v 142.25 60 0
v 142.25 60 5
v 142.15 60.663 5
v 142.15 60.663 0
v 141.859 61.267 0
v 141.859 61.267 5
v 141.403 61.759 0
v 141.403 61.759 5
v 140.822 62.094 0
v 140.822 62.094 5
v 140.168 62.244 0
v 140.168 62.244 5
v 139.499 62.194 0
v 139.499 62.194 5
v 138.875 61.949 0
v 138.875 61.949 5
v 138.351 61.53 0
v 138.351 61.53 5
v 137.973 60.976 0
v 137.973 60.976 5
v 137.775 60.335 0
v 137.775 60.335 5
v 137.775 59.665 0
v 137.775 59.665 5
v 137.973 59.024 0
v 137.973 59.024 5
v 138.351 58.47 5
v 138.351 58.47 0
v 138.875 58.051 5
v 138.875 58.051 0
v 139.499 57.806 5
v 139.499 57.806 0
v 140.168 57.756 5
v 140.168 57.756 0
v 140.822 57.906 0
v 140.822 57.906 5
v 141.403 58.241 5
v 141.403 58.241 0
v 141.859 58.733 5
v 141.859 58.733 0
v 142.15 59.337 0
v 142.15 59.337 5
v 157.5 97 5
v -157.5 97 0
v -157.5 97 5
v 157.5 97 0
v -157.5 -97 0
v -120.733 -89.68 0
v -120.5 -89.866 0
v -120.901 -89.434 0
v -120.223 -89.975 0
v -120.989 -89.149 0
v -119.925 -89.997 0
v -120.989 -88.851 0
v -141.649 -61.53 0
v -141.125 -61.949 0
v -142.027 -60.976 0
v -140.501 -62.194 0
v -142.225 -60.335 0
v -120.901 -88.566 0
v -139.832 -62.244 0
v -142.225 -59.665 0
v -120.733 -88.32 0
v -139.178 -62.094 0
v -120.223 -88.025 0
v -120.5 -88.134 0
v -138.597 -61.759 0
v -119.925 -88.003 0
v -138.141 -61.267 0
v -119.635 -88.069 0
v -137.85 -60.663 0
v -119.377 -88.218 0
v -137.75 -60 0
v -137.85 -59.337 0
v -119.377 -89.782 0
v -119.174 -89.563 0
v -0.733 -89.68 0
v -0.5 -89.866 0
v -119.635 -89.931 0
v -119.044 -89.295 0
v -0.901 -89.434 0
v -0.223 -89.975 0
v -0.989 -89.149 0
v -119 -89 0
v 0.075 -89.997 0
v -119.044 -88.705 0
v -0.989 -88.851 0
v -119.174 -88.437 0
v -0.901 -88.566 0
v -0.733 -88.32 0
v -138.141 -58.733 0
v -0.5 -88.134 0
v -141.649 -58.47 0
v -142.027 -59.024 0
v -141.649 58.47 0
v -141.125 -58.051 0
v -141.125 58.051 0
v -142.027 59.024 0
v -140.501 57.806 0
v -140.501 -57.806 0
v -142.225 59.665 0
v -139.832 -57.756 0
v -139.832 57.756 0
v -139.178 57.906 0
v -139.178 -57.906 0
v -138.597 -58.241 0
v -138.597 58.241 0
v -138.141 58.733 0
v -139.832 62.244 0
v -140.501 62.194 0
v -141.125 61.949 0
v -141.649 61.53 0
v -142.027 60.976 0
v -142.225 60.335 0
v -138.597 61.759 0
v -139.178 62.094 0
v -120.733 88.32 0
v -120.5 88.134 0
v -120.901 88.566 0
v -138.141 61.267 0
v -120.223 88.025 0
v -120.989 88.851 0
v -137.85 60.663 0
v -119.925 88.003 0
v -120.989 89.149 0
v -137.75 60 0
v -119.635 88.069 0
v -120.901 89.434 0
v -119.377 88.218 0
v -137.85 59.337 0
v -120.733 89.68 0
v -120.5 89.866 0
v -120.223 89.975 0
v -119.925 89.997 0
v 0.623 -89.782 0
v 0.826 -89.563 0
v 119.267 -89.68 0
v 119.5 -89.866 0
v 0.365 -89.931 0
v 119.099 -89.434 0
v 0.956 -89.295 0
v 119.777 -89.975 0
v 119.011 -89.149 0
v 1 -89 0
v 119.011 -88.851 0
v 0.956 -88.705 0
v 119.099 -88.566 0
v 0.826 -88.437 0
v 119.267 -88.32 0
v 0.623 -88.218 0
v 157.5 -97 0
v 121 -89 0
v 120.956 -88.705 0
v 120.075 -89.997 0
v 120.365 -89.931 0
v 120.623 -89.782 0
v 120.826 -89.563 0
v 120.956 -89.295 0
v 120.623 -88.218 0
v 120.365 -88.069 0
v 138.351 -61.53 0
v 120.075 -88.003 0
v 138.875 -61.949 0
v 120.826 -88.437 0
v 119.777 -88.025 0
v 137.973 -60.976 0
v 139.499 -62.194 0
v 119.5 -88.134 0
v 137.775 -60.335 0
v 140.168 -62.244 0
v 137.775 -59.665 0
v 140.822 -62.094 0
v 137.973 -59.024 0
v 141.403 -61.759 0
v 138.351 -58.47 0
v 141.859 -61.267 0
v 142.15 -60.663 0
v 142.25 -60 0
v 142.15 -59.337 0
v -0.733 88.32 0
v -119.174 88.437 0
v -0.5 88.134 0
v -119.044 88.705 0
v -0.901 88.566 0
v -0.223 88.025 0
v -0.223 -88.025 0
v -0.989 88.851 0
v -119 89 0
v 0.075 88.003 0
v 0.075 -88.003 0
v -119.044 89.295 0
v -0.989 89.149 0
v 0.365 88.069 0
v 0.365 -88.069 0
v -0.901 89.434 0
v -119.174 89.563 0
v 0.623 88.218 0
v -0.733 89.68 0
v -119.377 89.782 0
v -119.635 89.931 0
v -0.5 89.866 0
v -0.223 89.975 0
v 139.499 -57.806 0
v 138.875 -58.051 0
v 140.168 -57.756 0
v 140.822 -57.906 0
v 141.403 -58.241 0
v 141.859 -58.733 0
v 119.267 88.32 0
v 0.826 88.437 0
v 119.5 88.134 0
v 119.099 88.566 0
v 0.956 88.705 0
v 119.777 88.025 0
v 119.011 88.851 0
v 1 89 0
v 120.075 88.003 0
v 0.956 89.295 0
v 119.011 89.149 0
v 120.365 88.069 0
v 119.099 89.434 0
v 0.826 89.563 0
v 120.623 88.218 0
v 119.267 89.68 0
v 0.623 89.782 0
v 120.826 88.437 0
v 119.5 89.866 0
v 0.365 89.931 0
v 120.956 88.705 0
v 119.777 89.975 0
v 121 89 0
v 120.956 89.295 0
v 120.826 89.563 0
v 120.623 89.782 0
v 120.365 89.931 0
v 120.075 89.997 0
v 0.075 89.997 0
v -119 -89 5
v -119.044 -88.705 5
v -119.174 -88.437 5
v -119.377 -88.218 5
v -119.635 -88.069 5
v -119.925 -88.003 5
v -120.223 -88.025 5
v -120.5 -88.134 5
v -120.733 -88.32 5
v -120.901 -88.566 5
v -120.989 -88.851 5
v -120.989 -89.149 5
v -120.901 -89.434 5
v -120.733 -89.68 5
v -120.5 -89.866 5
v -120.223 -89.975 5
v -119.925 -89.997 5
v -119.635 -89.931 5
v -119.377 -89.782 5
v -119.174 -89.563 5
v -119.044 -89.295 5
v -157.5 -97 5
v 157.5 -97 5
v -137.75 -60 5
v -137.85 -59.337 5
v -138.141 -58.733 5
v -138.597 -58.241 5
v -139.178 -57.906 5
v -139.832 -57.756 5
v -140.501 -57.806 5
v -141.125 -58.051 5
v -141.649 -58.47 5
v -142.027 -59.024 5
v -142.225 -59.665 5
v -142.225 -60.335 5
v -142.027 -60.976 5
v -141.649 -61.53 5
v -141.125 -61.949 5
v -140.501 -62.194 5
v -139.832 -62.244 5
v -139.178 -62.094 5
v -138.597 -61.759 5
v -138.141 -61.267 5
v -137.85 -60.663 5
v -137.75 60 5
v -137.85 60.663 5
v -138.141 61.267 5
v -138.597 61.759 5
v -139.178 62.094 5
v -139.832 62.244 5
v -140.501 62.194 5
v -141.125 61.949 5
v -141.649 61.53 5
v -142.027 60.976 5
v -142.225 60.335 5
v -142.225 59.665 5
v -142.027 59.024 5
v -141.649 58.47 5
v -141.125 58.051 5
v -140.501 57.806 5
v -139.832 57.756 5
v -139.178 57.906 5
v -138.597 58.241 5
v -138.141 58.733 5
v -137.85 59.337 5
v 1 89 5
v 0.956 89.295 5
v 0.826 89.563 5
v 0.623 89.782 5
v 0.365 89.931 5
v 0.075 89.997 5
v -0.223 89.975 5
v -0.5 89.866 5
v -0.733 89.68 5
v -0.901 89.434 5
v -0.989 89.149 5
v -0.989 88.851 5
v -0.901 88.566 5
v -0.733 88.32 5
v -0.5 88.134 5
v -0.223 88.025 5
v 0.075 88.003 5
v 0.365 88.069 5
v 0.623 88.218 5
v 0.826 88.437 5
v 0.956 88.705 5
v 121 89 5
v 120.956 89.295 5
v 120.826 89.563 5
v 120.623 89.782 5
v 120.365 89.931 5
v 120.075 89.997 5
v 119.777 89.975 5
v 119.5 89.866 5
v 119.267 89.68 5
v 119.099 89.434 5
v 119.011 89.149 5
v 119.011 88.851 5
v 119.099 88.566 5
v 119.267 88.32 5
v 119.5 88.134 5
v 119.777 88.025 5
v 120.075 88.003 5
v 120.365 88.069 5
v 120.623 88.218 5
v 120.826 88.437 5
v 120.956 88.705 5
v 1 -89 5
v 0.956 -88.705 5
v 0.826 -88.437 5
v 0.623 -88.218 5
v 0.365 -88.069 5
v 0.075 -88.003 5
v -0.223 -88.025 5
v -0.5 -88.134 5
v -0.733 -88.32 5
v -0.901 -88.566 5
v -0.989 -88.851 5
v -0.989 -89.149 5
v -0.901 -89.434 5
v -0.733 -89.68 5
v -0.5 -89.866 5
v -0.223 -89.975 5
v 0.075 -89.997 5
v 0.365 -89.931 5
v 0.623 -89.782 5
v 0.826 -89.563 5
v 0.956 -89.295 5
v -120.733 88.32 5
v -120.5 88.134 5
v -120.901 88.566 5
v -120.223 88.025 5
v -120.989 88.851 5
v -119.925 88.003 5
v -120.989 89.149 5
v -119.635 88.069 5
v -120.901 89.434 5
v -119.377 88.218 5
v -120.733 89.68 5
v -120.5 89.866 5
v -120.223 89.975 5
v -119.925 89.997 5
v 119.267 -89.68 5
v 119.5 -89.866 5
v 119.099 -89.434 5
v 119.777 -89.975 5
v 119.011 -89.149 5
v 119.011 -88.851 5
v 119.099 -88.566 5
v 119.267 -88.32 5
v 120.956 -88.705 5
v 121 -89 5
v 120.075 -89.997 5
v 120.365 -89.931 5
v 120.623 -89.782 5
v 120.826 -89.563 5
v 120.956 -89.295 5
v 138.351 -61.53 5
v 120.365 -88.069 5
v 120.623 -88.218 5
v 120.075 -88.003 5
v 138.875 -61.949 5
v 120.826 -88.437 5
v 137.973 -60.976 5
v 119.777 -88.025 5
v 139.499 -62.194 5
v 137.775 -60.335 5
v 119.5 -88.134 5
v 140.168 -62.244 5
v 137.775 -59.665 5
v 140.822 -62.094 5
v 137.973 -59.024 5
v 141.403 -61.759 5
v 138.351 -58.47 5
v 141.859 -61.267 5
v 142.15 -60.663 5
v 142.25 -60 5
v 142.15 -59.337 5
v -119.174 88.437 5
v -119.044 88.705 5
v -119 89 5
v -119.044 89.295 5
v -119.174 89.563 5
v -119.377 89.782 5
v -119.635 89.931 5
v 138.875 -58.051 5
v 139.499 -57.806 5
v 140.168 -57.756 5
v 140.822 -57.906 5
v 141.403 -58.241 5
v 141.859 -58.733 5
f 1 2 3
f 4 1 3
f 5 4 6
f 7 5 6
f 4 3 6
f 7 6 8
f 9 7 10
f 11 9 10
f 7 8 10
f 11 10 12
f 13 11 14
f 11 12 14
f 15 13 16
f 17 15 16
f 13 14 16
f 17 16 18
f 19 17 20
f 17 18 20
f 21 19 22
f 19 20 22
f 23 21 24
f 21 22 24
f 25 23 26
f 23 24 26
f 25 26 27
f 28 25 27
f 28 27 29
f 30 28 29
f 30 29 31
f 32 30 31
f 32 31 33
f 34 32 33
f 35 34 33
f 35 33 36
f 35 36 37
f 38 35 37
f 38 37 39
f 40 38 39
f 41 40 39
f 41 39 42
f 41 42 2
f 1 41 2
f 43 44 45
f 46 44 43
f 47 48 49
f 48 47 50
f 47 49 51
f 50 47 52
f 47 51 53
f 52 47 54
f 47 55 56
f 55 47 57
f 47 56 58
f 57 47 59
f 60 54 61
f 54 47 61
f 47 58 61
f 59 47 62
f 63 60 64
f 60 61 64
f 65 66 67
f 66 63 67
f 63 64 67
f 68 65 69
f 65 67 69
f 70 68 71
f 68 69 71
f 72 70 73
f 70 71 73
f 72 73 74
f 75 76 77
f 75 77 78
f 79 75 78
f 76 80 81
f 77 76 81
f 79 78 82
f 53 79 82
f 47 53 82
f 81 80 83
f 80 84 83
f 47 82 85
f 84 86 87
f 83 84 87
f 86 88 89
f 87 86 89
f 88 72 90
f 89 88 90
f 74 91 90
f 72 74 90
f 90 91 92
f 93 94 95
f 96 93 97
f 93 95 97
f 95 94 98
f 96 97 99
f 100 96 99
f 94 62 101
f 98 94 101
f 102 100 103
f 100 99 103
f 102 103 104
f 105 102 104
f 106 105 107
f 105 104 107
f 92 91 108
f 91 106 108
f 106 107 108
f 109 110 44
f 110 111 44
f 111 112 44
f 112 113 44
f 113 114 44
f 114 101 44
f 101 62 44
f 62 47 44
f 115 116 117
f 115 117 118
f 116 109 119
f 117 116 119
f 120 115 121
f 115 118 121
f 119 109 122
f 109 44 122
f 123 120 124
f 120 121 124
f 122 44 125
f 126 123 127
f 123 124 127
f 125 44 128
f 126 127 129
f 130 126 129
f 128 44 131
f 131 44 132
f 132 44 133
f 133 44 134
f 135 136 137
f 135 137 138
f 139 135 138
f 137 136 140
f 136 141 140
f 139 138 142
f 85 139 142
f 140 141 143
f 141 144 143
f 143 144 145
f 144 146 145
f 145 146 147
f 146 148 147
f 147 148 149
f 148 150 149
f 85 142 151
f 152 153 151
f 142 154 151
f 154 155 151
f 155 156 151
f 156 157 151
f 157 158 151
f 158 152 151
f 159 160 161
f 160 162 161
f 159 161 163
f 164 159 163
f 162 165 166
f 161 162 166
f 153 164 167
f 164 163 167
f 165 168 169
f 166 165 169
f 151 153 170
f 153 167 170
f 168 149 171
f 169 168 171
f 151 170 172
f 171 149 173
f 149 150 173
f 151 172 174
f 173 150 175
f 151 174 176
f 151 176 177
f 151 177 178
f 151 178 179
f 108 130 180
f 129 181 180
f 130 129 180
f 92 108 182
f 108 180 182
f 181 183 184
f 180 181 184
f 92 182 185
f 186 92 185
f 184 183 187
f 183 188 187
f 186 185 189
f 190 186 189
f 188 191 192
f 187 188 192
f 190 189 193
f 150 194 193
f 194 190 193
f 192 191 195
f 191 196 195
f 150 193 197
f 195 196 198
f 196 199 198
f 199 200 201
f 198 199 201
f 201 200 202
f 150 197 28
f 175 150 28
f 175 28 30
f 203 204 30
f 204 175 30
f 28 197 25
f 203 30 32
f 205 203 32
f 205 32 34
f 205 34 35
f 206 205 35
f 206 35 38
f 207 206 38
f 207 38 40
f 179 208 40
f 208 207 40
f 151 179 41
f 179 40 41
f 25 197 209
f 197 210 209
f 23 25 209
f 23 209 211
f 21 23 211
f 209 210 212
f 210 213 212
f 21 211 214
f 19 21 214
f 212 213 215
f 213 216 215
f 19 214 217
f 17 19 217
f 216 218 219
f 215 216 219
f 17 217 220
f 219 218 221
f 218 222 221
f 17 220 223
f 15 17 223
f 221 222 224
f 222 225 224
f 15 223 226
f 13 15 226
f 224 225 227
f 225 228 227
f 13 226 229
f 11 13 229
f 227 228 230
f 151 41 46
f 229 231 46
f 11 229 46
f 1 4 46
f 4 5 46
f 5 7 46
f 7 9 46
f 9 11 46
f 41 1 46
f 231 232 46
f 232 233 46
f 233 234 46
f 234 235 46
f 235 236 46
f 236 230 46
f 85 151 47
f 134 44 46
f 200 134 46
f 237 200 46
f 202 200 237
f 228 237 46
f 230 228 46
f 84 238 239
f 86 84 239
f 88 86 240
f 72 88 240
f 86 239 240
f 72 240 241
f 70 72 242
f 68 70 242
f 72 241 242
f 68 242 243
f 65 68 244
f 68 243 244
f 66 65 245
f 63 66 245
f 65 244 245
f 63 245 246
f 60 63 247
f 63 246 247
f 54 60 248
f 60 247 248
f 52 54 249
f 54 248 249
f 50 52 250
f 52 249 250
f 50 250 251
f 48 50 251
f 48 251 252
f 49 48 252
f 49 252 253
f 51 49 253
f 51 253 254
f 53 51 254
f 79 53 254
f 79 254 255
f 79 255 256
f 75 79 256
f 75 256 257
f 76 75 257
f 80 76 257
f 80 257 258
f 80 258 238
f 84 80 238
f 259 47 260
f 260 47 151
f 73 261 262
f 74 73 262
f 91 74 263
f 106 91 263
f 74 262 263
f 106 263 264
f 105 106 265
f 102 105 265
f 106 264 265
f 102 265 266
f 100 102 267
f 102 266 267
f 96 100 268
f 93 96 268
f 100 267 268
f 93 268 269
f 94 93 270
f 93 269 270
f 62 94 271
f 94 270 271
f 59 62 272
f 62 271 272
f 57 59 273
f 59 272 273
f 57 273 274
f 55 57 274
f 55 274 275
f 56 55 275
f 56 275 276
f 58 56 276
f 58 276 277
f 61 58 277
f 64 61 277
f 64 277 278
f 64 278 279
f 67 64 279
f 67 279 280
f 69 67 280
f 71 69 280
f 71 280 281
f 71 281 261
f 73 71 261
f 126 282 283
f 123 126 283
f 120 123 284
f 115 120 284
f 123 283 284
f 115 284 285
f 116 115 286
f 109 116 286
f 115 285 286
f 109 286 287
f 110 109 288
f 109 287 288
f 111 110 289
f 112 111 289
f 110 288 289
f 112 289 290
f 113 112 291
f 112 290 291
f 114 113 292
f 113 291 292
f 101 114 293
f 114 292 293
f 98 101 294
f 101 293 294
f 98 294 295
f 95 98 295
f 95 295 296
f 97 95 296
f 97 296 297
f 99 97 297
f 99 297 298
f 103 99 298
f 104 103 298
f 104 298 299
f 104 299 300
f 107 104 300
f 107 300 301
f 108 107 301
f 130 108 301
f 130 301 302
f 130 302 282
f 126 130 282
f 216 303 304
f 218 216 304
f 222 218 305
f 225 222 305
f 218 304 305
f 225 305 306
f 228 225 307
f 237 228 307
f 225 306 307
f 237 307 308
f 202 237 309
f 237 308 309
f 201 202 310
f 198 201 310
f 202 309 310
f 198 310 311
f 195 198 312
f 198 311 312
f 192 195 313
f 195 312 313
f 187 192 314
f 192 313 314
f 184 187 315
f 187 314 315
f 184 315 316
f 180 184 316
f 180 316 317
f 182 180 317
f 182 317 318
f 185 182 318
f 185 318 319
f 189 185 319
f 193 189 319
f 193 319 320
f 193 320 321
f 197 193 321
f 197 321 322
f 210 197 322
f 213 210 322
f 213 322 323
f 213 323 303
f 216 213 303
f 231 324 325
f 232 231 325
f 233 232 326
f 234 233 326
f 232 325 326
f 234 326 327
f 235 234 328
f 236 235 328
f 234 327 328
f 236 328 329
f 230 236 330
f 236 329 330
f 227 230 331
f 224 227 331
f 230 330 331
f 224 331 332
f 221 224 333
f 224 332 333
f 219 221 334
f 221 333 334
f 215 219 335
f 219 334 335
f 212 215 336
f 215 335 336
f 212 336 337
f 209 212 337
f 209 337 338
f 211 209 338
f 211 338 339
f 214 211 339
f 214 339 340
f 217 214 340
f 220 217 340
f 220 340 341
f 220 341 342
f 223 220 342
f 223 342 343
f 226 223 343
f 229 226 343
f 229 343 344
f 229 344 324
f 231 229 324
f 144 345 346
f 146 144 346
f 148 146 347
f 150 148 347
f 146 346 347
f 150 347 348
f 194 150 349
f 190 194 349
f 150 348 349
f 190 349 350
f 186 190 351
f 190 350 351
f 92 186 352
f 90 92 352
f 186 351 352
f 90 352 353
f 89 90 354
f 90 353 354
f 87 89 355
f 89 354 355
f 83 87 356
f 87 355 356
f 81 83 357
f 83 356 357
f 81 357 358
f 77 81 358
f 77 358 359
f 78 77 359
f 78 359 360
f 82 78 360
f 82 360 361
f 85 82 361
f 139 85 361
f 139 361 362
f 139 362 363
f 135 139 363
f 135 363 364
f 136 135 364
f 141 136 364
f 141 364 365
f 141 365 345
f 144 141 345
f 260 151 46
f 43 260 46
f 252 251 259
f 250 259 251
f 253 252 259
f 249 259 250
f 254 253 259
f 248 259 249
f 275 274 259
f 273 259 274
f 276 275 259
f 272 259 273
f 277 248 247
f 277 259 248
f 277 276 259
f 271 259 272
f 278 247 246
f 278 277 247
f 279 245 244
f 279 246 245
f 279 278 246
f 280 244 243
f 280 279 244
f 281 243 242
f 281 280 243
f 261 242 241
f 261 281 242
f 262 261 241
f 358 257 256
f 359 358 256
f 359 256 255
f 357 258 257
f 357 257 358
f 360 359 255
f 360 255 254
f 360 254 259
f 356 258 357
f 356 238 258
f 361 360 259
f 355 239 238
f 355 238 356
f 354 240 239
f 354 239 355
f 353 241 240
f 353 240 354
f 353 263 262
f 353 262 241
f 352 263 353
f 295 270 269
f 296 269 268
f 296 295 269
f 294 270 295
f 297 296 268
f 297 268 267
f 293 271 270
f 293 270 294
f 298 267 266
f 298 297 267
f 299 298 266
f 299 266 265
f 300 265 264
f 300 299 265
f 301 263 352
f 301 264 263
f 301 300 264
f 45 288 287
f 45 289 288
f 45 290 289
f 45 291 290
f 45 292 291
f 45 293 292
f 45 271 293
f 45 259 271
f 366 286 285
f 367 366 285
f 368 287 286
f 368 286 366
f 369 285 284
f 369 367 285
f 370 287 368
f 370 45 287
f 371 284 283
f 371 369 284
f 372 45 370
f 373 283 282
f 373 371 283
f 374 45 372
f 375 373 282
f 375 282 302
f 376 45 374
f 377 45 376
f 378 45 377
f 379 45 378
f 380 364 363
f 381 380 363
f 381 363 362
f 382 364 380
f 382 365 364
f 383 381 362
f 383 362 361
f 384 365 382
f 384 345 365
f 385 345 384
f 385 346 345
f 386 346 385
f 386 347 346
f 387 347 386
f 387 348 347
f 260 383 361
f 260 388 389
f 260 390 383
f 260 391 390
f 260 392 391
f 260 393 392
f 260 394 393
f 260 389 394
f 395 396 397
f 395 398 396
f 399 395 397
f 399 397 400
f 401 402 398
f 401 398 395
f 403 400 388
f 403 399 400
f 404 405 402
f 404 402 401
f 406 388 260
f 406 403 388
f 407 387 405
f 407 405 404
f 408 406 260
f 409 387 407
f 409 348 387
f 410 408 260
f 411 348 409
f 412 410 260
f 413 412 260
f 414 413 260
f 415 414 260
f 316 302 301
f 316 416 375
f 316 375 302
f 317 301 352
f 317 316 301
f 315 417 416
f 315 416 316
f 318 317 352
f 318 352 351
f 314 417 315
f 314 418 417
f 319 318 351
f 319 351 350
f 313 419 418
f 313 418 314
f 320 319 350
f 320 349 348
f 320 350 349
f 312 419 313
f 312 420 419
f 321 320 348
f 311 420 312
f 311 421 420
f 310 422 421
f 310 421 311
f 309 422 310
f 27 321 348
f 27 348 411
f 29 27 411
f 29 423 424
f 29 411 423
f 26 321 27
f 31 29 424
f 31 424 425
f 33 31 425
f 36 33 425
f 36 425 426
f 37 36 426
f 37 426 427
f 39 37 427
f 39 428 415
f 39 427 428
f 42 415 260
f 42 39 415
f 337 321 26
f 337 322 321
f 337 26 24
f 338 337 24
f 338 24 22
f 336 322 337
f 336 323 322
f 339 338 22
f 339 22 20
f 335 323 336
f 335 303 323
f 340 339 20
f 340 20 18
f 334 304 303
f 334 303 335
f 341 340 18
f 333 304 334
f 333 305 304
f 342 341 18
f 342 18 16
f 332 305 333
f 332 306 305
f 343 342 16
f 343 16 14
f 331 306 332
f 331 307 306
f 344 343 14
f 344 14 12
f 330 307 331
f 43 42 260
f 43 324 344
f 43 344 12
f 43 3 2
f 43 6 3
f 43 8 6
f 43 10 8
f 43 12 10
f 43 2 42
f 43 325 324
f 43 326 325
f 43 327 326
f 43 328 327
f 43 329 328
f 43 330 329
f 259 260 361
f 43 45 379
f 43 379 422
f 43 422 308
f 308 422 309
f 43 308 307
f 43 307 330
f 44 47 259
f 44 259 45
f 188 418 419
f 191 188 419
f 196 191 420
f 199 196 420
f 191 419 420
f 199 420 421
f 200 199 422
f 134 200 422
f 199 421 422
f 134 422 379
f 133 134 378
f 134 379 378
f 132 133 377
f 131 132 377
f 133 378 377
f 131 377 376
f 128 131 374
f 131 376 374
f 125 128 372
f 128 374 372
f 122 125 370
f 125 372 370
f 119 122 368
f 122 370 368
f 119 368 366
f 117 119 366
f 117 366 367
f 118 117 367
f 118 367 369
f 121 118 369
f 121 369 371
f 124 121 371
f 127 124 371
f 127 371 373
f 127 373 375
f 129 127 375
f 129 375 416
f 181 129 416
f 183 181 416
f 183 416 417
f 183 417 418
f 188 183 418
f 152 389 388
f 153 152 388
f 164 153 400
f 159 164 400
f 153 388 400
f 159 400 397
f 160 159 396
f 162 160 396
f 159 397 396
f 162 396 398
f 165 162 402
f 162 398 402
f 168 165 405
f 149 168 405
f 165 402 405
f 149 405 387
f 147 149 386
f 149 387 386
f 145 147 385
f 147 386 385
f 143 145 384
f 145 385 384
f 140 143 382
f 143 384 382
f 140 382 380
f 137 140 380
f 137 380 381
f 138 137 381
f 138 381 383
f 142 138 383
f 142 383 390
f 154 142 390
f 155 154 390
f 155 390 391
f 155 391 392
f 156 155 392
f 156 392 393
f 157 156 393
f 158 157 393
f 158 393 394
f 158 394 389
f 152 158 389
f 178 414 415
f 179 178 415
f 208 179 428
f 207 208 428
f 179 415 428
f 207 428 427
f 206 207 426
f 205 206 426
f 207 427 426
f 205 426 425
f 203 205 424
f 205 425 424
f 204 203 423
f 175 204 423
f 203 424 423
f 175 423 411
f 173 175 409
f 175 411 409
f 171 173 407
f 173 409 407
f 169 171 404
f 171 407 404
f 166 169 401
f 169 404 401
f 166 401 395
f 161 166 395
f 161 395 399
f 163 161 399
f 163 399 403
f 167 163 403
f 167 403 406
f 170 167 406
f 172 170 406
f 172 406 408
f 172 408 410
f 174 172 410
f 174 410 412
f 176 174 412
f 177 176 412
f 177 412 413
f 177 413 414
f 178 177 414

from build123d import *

# Parameters (mm, degrees)
SKETCH_W        = 315
SKETCH_H        = 194
PAD_DEPTH       = 5
SKETCH001_R     = 1
POCKET_DEPTH    = 5.001
SKETCH002_R     = 2.25
POCKET001_DEPTH = 5.001


with BuildPart() as part:
    # Sketch → Pad (new body)
    with BuildSketch(Plane.XY):
        Rectangle(SKETCH_W, SKETCH_H)
    extrude(amount=PAD_DEPTH)

    # Sketch001 (on Face6 of Pad) → Pocket (cut, through all)
    with BuildSketch(Plane.XY.offset(5)):
        with Locations((-120, 89)):
            Circle(SKETCH001_R)
        with Locations((0, 89)):
            Circle(SKETCH001_R)
        with Locations((120, 89)):
            Circle(SKETCH001_R)
        with Locations((-120, -89)):
            Circle(SKETCH001_R)
        with Locations((0, -89)):
            Circle(SKETCH001_R)
        with Locations((120, -89)):
            Circle(SKETCH001_R)
    extrude(amount=-POCKET_DEPTH, mode=Mode.SUBTRACT)

    # Sketch002 (on Face5 of Pocket) → Pocket001 (cut, through all)
    with BuildSketch(Plane.XY.offset(5)):
        with Locations((-140, 60)):
            Circle(SKETCH002_R)
        with Locations((140, 60)):
            Circle(SKETCH002_R)
        with Locations((-140, -60)):
            Circle(SKETCH002_R)
        with Locations((140, -60)):
            Circle(SKETCH002_R)
    extrude(amount=-POCKET001_DEPTH, mode=Mode.SUBTRACT)


solid = part.part
